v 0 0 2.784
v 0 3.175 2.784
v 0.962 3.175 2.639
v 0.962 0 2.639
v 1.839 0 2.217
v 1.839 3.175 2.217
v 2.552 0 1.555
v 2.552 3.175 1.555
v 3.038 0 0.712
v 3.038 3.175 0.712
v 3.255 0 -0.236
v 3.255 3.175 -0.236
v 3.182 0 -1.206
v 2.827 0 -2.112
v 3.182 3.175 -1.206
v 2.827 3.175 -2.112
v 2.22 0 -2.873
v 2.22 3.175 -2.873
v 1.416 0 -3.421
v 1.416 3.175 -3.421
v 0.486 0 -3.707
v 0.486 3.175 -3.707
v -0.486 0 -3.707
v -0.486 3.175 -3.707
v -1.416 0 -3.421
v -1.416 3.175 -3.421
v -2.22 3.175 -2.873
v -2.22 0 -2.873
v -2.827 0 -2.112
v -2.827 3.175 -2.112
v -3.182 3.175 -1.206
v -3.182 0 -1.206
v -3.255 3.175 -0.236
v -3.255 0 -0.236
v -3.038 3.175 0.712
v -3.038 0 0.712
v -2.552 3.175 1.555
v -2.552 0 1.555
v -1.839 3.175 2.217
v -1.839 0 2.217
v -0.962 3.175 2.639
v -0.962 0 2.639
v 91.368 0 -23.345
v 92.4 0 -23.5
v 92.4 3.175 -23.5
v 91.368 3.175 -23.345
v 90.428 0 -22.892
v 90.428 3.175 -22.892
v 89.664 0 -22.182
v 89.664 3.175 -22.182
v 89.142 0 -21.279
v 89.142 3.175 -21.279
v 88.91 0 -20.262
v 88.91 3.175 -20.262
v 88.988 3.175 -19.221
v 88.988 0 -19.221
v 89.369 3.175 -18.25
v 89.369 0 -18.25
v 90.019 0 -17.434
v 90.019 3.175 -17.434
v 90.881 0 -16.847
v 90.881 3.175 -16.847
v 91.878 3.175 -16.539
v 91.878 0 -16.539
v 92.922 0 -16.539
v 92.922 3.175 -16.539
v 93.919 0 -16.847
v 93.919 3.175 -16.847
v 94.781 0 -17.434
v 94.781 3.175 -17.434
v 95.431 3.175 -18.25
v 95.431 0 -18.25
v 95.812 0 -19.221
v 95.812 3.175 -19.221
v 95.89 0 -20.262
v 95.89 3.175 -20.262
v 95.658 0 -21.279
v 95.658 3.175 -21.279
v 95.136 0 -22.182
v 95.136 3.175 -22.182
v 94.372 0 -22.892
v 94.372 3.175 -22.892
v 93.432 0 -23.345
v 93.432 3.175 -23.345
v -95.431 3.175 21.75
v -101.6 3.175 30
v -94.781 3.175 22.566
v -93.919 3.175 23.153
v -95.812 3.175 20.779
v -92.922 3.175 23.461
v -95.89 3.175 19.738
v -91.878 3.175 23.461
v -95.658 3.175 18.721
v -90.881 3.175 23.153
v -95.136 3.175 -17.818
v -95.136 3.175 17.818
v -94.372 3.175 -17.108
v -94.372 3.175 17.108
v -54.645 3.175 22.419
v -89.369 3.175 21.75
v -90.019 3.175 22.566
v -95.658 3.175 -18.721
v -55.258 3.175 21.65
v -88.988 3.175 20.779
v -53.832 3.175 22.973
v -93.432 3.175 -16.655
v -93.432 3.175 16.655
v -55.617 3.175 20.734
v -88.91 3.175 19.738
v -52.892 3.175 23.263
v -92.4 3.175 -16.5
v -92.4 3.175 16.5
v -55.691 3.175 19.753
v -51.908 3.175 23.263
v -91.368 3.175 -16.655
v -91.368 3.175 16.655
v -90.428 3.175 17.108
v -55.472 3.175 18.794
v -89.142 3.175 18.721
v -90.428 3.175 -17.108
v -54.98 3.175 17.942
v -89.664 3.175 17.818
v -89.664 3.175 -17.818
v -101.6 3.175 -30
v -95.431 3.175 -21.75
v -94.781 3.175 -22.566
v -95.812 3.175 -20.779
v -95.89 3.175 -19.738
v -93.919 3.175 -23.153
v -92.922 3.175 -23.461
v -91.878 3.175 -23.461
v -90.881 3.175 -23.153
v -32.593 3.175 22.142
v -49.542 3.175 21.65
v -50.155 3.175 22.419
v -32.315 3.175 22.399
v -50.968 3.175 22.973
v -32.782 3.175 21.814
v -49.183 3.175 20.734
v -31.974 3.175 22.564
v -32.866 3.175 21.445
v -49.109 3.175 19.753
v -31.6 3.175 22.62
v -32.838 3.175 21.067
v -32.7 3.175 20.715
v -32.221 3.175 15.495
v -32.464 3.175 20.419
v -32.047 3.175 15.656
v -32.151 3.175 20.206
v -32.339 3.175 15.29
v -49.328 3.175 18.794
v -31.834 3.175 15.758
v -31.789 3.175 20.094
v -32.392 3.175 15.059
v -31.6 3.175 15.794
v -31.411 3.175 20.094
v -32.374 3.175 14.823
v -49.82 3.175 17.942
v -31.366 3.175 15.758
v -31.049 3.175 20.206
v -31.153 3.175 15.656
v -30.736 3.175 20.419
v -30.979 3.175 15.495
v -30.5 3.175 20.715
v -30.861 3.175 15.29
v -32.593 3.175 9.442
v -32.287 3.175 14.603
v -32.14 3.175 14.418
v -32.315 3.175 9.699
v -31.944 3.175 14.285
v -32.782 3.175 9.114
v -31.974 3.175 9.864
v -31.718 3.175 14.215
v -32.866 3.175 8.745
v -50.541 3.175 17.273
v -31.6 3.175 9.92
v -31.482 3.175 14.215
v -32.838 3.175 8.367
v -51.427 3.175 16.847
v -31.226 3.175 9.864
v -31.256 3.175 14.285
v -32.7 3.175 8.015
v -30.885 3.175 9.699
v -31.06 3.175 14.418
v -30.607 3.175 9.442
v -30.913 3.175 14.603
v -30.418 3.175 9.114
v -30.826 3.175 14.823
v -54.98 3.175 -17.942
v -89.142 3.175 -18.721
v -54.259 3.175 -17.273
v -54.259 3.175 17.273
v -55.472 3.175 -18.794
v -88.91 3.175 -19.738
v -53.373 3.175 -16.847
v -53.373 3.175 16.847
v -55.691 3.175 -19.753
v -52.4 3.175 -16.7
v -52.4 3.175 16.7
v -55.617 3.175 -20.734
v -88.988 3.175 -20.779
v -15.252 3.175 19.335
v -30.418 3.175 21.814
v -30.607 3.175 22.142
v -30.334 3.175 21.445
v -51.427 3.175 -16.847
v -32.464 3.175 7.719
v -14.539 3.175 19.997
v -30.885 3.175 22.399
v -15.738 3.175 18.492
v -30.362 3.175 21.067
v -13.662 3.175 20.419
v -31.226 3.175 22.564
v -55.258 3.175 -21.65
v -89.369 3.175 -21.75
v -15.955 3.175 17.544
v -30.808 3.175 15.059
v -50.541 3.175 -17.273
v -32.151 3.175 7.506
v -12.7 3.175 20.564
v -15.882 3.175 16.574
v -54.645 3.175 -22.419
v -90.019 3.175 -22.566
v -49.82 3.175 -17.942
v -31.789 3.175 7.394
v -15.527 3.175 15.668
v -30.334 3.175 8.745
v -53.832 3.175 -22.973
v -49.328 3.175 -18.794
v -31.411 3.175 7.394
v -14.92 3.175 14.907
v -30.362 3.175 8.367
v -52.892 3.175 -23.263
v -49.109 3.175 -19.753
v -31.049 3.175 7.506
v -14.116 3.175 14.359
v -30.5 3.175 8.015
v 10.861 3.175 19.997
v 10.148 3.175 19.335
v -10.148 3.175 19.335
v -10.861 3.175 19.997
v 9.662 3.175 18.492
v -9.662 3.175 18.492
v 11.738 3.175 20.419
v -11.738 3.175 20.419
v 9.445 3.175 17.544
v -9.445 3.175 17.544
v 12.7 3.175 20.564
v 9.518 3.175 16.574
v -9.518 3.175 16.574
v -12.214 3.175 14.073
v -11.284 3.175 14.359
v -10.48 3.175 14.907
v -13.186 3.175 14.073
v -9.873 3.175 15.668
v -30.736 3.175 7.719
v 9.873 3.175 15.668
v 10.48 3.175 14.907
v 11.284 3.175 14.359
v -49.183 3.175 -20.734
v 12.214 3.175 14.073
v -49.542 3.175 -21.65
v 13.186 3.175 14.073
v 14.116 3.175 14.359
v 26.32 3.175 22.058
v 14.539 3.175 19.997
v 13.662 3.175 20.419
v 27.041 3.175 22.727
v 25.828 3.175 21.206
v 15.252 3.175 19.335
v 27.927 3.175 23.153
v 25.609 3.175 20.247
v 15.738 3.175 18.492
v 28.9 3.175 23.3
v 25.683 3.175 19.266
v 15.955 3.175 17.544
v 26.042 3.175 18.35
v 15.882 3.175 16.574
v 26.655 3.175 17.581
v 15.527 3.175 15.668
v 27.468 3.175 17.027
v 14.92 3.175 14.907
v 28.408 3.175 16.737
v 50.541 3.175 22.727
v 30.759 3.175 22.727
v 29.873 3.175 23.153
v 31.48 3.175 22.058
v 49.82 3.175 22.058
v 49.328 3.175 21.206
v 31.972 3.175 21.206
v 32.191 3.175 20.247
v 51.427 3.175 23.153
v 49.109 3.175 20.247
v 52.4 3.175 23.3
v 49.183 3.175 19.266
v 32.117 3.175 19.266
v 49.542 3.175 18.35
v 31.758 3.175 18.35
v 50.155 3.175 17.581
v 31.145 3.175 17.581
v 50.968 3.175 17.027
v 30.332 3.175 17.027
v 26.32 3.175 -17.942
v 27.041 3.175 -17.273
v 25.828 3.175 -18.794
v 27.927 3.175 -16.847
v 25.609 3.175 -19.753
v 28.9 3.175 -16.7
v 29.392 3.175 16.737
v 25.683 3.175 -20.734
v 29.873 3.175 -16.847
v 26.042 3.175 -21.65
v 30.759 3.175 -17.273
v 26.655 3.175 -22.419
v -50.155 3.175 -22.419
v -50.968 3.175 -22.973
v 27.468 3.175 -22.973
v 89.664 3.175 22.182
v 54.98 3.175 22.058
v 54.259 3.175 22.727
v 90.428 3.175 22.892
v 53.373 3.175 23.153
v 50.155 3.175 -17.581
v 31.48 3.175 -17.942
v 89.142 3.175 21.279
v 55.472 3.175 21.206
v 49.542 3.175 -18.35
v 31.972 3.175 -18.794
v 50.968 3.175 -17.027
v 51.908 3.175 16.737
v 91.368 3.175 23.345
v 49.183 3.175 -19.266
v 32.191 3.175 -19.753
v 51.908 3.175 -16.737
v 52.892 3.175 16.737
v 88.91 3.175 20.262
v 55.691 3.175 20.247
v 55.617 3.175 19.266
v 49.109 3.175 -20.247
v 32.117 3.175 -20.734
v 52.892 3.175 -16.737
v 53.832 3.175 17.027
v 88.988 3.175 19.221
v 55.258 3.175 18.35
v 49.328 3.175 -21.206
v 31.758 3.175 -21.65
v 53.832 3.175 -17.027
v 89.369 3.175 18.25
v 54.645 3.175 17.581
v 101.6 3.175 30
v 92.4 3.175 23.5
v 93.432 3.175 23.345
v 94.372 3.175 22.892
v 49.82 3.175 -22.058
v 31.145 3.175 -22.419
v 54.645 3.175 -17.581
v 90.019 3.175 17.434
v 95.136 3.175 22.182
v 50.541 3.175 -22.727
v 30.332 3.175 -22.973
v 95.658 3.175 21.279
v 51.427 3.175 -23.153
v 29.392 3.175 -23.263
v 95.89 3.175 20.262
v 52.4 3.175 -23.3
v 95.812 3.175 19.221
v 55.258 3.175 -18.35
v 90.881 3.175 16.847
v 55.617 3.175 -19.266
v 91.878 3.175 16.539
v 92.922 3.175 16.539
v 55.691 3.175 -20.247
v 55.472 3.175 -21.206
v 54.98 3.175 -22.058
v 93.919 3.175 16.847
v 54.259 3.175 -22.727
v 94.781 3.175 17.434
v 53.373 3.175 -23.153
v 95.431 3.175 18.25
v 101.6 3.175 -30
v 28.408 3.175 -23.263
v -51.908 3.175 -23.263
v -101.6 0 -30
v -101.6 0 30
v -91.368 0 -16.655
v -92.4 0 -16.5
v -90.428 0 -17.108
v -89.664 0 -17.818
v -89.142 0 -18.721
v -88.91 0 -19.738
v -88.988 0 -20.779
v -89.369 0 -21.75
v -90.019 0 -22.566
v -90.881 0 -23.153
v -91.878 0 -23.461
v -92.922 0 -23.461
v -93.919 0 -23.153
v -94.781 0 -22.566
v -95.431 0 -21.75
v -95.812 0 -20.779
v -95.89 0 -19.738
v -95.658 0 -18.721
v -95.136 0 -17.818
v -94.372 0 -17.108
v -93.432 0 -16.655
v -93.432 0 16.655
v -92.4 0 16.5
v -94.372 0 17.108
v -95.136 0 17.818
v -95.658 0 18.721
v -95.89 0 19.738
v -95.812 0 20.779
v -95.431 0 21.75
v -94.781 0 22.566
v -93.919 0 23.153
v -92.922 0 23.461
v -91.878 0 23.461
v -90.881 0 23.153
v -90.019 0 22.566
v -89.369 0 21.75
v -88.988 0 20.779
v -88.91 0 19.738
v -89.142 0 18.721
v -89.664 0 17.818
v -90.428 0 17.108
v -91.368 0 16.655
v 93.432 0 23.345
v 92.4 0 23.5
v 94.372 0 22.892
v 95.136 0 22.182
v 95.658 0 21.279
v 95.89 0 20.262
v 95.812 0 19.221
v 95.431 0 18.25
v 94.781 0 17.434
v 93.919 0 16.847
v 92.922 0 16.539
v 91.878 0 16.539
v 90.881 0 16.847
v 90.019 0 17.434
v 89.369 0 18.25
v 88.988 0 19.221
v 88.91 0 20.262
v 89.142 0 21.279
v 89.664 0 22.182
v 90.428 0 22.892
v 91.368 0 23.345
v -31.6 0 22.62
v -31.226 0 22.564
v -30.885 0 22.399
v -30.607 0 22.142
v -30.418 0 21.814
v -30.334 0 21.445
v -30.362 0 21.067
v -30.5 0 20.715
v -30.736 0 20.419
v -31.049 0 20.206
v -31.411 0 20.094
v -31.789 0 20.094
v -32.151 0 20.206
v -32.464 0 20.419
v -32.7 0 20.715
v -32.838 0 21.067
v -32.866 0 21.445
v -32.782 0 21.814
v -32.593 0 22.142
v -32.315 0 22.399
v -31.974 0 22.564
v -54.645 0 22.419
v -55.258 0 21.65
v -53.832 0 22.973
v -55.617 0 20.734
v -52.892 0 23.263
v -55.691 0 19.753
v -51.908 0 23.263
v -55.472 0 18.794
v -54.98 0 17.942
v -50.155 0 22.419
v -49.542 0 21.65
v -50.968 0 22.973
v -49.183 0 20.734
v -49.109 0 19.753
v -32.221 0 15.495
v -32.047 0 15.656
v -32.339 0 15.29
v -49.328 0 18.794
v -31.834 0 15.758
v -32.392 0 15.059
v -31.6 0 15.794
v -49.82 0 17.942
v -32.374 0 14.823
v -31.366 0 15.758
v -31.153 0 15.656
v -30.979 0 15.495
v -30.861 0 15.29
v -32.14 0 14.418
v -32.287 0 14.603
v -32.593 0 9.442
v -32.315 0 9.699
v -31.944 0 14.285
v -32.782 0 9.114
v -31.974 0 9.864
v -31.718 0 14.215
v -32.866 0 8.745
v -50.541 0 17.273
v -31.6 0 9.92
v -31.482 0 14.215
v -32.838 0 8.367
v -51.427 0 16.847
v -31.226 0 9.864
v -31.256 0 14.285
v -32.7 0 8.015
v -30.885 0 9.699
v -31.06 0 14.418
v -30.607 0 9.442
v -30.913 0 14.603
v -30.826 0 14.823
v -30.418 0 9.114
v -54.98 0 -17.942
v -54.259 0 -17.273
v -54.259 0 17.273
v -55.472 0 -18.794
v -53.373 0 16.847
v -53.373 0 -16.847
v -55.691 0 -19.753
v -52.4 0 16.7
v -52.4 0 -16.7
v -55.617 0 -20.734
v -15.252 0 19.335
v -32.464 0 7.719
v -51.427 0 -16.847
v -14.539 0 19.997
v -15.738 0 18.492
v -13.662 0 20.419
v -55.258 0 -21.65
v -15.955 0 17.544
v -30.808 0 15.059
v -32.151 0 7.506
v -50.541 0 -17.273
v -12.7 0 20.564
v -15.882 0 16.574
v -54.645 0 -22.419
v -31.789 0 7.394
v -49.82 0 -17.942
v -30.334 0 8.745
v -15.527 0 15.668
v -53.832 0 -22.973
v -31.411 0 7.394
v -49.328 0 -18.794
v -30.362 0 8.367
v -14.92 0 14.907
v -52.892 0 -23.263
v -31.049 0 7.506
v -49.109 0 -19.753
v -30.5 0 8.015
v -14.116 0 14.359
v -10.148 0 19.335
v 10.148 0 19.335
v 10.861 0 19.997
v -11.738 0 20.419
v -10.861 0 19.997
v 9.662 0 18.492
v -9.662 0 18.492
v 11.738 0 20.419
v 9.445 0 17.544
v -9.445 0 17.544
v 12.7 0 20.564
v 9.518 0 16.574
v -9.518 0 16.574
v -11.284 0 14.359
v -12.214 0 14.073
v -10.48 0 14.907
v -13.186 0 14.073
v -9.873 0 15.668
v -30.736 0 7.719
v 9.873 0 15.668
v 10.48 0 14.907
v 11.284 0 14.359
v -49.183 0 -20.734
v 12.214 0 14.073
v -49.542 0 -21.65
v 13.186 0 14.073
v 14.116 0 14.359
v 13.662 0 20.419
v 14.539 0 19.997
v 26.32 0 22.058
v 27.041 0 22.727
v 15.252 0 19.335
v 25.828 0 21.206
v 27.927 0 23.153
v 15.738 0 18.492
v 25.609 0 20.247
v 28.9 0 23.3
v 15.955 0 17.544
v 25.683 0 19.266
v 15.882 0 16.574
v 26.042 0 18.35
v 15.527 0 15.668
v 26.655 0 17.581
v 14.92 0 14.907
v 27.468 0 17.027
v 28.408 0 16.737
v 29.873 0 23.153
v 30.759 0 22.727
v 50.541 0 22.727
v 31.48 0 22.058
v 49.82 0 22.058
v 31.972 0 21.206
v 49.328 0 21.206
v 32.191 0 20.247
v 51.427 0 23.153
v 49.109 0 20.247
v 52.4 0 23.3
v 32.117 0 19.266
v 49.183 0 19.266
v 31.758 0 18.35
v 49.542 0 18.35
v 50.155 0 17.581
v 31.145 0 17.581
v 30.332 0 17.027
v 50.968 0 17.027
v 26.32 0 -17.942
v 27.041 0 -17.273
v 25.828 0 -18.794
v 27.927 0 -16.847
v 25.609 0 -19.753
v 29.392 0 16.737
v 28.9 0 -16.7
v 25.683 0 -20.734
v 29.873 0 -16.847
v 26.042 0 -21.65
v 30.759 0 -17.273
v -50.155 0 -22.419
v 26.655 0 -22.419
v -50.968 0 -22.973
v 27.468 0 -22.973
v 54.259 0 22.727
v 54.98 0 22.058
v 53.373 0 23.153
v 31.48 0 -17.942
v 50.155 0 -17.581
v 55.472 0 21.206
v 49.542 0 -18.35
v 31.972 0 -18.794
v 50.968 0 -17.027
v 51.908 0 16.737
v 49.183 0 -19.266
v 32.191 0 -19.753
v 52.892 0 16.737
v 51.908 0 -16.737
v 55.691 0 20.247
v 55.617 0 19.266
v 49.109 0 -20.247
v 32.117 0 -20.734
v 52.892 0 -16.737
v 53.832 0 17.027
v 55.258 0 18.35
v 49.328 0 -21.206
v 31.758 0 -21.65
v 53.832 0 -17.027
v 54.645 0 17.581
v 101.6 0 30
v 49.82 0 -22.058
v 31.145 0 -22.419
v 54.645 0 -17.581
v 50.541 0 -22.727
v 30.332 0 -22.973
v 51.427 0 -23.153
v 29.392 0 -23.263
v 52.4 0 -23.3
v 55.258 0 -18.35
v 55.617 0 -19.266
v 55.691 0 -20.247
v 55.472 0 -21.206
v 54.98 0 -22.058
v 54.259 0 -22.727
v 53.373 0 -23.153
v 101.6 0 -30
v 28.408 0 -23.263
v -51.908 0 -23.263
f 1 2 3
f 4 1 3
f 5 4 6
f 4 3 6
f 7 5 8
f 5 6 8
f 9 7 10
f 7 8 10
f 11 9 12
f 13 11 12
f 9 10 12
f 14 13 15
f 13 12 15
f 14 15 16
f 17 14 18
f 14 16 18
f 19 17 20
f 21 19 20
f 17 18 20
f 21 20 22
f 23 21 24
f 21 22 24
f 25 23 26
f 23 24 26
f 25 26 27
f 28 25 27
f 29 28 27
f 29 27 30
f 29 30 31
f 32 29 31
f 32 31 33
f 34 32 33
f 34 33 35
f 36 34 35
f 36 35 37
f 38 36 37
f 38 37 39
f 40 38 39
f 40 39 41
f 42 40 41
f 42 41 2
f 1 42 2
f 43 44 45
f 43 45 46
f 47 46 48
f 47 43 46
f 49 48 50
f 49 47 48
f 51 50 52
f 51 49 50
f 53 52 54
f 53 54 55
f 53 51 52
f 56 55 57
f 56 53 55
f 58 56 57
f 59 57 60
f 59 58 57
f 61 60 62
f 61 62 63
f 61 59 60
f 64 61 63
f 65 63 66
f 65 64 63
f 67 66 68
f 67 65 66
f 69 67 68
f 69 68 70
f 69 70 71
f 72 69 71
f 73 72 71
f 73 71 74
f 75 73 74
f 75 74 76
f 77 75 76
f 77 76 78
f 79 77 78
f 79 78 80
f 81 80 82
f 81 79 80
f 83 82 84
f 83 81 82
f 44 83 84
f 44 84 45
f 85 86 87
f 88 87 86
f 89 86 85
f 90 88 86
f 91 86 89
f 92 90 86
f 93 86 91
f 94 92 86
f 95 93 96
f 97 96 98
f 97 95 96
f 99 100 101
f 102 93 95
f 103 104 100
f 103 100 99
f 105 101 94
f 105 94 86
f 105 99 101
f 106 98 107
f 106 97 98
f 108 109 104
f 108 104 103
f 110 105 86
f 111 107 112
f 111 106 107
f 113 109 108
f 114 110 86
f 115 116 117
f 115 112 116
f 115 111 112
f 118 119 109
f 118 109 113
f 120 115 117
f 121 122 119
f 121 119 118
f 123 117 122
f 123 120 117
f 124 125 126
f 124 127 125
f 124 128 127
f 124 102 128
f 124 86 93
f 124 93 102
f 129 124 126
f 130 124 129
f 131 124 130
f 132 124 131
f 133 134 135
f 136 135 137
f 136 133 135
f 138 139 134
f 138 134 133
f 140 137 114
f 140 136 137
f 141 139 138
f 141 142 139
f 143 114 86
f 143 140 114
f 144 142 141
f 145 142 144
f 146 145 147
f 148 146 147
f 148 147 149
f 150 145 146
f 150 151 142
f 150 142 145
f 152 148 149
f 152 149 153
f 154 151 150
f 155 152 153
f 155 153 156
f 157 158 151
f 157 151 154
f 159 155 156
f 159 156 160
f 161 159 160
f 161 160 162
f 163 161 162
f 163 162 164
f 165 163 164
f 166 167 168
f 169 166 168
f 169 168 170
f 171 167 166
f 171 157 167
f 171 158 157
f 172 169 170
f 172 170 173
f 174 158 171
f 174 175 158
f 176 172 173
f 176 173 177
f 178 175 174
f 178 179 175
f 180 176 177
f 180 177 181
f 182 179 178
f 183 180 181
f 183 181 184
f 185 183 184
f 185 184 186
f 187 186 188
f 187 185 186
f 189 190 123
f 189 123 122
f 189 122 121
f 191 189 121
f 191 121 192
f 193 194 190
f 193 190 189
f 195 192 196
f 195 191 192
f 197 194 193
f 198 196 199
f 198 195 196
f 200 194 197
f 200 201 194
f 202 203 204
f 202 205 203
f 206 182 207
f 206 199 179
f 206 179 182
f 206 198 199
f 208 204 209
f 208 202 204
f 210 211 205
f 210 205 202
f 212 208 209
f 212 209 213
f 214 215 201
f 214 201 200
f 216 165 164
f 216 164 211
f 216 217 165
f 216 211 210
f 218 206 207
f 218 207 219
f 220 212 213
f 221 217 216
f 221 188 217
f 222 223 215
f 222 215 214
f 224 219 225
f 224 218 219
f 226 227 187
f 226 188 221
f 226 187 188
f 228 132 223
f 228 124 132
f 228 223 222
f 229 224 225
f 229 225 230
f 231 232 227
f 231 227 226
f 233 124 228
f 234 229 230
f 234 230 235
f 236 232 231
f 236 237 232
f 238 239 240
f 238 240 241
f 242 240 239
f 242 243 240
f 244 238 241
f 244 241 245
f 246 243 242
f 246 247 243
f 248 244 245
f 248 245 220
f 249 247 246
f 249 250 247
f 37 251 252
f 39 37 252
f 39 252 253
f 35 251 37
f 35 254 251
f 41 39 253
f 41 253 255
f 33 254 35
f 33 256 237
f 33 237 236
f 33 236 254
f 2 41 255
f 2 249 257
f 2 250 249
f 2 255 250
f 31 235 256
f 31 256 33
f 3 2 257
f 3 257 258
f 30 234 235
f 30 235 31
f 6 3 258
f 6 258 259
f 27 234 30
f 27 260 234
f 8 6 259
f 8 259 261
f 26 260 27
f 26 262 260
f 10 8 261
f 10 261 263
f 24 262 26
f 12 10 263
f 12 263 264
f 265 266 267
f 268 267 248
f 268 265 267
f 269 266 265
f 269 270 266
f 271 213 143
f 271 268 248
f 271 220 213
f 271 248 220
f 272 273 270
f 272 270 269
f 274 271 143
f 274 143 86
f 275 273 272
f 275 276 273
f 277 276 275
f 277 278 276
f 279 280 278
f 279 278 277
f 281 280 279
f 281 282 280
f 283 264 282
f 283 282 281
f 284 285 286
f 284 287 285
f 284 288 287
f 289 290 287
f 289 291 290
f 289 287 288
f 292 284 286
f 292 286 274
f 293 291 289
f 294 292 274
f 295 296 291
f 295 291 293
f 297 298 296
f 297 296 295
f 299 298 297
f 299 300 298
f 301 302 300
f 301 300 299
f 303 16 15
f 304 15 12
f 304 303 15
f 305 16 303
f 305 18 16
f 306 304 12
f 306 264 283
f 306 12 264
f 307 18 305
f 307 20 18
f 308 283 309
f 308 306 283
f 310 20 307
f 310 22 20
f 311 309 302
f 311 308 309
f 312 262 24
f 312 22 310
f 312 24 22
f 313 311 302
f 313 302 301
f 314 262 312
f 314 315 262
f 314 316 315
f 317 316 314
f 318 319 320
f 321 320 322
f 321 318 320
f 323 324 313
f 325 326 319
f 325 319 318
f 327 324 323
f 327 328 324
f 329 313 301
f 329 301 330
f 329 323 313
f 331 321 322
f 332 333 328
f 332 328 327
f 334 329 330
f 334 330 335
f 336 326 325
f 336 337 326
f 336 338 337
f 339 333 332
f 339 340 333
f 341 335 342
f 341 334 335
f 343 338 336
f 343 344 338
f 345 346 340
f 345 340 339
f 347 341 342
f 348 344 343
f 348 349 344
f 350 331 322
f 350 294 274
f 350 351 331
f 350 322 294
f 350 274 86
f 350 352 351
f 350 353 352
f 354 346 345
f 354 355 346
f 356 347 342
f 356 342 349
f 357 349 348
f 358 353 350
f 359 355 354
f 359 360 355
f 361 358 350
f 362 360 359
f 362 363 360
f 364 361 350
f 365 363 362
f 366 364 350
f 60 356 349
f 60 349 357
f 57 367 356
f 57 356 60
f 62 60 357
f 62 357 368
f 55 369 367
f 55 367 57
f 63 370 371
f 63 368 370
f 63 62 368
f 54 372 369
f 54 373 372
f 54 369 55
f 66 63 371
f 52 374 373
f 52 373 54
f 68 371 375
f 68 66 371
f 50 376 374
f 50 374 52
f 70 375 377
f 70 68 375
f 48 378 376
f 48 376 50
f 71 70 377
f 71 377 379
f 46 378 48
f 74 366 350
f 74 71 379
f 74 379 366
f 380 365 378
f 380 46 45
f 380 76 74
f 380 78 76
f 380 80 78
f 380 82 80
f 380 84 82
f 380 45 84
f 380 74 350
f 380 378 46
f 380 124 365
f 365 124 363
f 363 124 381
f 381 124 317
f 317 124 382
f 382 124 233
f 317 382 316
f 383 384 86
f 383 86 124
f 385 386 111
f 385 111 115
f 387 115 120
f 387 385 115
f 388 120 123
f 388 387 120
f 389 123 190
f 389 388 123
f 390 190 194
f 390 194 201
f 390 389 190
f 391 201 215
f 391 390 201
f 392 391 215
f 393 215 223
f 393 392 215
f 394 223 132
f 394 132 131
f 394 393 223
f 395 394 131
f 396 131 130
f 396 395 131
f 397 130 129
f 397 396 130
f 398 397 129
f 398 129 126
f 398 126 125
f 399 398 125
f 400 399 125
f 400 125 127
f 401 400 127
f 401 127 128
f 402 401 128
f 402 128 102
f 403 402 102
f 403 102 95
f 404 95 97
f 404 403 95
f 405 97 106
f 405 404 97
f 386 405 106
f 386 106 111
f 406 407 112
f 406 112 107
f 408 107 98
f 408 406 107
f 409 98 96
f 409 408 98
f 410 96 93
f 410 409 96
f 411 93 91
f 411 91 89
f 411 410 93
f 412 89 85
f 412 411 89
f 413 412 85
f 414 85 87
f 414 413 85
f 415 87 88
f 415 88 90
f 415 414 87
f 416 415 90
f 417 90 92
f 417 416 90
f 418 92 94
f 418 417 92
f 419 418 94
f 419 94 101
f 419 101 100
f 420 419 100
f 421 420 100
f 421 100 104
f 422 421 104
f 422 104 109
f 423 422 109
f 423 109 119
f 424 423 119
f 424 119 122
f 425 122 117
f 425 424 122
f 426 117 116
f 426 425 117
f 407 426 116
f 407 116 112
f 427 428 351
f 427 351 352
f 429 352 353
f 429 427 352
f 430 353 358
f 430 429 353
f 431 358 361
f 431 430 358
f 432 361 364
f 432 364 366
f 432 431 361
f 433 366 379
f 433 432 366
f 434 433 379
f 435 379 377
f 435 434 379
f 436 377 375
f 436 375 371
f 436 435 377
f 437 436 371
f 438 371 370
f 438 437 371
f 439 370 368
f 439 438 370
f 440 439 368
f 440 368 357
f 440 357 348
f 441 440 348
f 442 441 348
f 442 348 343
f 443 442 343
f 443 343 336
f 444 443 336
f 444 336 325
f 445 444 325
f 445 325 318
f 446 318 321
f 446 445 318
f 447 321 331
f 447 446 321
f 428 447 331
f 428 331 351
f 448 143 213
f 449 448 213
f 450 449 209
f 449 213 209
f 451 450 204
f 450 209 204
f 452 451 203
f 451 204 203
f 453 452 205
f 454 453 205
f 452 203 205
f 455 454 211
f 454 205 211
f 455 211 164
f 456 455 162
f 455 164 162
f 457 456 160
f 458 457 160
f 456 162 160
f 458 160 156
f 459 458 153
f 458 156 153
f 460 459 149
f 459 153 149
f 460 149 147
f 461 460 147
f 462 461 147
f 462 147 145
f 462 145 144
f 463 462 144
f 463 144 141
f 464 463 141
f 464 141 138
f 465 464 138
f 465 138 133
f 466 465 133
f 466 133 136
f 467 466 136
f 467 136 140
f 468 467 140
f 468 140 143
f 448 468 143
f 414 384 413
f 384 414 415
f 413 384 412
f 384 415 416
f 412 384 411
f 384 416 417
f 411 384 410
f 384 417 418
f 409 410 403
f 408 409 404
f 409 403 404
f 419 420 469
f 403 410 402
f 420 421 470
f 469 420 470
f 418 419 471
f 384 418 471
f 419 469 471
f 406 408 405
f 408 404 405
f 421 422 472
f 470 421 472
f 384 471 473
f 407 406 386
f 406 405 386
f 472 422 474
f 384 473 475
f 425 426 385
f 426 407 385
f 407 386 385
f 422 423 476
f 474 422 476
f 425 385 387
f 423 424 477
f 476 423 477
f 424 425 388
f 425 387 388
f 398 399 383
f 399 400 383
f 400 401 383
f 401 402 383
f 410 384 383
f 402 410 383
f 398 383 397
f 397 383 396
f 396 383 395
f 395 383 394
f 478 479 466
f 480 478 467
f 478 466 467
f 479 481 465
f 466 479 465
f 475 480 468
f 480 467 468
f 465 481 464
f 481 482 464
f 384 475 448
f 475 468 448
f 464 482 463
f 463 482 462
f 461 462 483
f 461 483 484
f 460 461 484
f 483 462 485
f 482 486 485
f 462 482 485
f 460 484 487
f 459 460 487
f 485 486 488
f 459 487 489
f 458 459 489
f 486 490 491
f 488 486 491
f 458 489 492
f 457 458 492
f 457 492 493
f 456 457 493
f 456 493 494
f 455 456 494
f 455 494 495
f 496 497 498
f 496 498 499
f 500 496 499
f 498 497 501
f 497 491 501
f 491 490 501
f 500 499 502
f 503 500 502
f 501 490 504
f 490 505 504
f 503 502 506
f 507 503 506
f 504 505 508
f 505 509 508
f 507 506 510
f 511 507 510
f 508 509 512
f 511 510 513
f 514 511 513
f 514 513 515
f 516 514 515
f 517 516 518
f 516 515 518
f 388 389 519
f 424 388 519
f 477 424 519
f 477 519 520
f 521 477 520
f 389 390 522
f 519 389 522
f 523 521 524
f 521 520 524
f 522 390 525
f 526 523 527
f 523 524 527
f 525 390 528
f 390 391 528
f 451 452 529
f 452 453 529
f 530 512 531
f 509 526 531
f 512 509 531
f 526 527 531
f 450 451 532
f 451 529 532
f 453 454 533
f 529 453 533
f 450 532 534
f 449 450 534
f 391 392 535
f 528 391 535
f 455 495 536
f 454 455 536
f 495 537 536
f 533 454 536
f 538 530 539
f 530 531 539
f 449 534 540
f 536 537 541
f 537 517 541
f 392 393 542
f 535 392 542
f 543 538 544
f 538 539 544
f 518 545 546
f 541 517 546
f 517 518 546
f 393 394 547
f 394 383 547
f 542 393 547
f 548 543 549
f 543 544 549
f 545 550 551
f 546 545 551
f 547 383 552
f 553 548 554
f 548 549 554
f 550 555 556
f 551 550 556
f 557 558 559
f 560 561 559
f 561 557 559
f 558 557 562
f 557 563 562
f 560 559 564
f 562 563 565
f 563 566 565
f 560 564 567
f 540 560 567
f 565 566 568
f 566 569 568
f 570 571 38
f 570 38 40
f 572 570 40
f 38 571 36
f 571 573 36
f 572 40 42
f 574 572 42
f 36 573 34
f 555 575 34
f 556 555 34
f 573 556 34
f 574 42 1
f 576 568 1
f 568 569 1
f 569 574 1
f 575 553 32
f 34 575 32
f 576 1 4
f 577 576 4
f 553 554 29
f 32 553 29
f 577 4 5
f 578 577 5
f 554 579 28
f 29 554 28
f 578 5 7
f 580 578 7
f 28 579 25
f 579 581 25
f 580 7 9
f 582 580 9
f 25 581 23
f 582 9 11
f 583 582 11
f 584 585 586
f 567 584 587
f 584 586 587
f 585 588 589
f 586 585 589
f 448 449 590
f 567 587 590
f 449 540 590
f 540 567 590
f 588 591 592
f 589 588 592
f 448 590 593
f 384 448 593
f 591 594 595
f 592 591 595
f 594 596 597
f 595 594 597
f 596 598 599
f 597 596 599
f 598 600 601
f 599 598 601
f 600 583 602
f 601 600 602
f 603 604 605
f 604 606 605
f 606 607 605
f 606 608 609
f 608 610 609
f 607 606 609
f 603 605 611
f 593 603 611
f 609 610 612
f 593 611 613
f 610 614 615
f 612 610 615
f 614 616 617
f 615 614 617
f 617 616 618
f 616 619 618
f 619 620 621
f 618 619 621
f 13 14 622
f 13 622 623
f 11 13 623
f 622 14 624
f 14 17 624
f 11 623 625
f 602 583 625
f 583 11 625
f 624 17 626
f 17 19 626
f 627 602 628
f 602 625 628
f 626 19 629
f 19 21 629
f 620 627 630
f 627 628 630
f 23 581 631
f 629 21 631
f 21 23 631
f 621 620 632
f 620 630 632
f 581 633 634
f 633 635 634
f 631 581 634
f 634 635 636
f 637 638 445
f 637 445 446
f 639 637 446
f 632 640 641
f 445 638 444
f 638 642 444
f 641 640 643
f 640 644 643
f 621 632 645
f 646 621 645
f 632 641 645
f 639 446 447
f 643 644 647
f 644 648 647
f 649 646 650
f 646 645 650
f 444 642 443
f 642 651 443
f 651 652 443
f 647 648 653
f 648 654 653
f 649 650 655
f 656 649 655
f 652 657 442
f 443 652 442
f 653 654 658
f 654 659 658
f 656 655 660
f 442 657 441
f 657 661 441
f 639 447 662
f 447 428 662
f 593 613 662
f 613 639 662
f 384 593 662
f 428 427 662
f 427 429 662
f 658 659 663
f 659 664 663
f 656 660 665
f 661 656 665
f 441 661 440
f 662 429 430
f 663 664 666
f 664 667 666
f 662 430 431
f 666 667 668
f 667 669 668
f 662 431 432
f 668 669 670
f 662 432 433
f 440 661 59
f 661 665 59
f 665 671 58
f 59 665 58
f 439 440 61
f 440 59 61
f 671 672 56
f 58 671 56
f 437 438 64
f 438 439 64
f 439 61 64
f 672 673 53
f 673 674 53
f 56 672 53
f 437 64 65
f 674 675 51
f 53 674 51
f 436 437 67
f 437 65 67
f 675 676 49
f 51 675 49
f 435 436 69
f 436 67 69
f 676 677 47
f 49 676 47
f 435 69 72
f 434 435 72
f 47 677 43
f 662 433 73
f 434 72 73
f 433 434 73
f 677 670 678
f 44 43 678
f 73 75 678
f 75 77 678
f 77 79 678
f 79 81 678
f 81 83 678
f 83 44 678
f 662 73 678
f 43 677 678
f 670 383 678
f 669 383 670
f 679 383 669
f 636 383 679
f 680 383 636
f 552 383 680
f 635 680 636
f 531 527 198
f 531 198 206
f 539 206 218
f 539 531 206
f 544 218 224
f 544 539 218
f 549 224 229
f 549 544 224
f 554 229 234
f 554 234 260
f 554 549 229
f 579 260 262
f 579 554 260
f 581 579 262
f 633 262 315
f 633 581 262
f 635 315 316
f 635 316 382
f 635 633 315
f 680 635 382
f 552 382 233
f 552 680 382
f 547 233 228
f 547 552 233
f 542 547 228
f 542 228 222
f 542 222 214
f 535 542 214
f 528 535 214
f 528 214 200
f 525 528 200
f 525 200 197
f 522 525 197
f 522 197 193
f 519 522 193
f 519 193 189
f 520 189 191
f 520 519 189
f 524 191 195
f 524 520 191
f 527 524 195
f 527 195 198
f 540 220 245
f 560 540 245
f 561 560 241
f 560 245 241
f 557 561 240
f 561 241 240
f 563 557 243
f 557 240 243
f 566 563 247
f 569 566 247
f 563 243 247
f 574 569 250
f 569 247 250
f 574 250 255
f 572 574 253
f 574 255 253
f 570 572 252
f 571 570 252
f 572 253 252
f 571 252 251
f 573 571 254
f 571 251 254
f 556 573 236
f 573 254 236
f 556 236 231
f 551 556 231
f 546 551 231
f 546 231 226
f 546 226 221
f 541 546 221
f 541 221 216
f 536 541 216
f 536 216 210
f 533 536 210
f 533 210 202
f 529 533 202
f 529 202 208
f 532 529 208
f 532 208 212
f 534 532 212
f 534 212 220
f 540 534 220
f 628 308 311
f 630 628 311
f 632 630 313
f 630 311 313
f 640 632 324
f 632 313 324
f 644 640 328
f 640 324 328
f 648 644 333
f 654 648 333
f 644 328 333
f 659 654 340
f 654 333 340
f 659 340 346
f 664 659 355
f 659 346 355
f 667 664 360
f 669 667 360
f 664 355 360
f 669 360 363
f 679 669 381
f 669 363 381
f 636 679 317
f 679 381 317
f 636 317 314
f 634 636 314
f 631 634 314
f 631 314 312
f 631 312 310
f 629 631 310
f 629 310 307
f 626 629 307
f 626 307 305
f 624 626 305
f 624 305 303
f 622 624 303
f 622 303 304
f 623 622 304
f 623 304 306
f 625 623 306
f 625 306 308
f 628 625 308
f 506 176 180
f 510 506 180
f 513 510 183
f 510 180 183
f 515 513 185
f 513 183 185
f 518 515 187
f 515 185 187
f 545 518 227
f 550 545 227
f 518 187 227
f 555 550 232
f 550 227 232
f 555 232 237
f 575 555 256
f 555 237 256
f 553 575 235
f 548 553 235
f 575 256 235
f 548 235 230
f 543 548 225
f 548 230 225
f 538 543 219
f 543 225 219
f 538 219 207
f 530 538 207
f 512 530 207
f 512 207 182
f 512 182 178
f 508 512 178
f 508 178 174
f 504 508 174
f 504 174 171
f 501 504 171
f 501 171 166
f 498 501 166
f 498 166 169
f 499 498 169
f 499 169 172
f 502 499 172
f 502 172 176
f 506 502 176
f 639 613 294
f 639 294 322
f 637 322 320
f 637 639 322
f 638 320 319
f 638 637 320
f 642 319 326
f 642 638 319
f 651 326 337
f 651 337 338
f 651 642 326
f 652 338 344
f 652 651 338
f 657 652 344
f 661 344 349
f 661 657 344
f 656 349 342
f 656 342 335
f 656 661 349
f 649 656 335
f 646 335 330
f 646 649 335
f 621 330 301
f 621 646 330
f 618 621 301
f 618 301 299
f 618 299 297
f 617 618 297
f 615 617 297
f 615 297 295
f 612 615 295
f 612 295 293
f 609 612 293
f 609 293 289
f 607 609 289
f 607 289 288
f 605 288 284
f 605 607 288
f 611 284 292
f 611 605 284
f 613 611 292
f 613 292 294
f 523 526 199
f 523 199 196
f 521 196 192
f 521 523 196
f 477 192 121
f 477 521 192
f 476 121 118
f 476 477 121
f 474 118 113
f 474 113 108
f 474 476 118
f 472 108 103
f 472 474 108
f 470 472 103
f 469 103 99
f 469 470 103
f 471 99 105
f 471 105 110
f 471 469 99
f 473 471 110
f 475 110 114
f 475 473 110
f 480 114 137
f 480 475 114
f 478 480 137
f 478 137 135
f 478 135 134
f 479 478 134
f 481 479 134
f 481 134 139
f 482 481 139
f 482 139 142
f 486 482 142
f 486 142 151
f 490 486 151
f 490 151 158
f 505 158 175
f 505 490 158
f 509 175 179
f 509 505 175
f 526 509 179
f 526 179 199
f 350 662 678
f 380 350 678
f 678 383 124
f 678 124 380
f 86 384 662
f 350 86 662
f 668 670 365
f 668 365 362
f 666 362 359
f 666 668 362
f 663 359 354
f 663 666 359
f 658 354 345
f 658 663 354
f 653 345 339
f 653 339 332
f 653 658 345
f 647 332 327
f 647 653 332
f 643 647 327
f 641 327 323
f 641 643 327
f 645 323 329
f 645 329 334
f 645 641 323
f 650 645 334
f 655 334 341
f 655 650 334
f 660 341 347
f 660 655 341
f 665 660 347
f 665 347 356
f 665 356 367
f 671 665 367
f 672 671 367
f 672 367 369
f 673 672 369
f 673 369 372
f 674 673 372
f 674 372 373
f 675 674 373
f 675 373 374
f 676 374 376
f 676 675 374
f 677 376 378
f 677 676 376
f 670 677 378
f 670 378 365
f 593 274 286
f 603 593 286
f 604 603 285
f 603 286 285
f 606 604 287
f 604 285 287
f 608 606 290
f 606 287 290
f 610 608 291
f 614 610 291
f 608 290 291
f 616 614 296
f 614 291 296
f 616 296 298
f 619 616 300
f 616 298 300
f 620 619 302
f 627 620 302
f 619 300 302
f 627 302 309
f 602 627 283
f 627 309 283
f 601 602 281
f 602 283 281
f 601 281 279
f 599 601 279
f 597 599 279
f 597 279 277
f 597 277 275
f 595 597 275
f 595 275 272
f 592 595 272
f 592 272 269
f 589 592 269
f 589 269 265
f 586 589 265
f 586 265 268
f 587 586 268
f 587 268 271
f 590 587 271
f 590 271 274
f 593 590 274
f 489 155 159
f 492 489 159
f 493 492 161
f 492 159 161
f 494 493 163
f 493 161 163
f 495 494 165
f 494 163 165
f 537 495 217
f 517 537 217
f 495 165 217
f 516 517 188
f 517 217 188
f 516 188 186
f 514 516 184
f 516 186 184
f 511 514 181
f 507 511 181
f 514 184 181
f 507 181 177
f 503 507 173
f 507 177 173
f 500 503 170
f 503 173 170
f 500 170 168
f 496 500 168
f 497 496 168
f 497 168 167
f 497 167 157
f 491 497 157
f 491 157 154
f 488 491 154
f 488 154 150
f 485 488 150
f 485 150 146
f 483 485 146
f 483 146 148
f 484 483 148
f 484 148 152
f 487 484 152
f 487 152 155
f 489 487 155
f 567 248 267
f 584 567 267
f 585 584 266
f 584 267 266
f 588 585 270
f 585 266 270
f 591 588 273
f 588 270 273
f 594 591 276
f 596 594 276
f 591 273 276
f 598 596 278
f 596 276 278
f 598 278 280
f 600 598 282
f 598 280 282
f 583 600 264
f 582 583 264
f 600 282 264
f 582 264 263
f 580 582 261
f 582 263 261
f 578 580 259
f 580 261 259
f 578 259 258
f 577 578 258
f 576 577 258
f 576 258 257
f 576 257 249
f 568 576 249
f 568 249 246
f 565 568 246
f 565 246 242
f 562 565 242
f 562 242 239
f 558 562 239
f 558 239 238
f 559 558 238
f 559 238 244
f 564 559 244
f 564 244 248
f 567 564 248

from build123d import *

# Parameters (mm, degrees)
SKETCH1_W                      = 203.2
SKETCH1_H                      = 60
SKETCH1_R                      = 3.3
SKETCH1_R_2                    = 3.5
BOSS_EXTRUDE1_DEPTH            = 3.175
SKETCH2_R                      = 3.2639
F_1_4_20_FOR_NUT_BRACKET_DEPTH = 106.984152707
SKETCH3_R                      = 0.79375
SKETCH3_R_2                    = 1.27
WIRE_HOLDER_DEPTH              = 106.984152707
SKETCH4_R                      = 3.3
CUT_EXTRUDE1_DEPTH             = 106.984152707


with BuildPart() as part:
    # Sketch1 → Boss-Extrude1 (new body)
    with BuildSketch(Plane(origin=(0, 0, 0), x_dir=(1, 0, 0), z_dir=(0, 1, 0))):
        Rectangle(SKETCH1_W, SKETCH1_H)
        with Locations(Location((-52.4, 20, 0), (0, 0, 270))):
            Circle(SKETCH1_R, mode=Mode.SUBTRACT)
        with Locations(Location((-92.4, -20, 0), (0, 0, 90))):
            Circle(SKETCH1_R_2, mode=Mode.SUBTRACT)
        with Locations(Location((-52.4, -20, 0), (0, 0, 90))):
            Circle(SKETCH1_R, mode=Mode.SUBTRACT)
        with Locations(Location((92.4, 20, 0), (0, 0, 90))):
            Circle(SKETCH1_R_2, mode=Mode.SUBTRACT)
        with Locations(Location((-92.4, 20, 0), (0, 0, 270))):
            Circle(SKETCH1_R_2, mode=Mode.SUBTRACT)
        with Locations(Location((52.4, -20, 0), (0, 0, 270))):
            Circle(SKETCH1_R, mode=Mode.SUBTRACT)
        with Locations(Location((92.4, -20, 0), (0, 0, 270))):
            Circle(SKETCH1_R_2, mode=Mode.SUBTRACT)
        with Locations(Location((52.4, 20, 0), (0, 0, 90))):
            Circle(SKETCH1_R, mode=Mode.SUBTRACT)
    extrude(amount=BOSS_EXTRUDE1_DEPTH)

    # Sketch2 → 1/4-20 for Nut Bracket (cut, through all)
    with BuildSketch(Plane(origin=(0, 3.175, 0), x_dir=(1, 0, 0), z_dir=(0, 1, 0))):
        with Locations(Location((-12.7, -17.3, 0), (0, 0, 270))):
            Circle(SKETCH2_R)
        with Locations(Location((12.7, -17.3, 0), (0, 0, 270))):
            Circle(SKETCH2_R)
        with Locations(Location((0, 0.48, 0), (0, 0, 270))):
            Circle(SKETCH2_R)
    extrude(amount=-F_1_4_20_FOR_NUT_BRACKET_DEPTH, mode=Mode.SUBTRACT)

    # Sketch3 → Wire Holder (cut, through all)
    with BuildSketch(Plane(origin=(0, 3.175, 0), x_dir=(1, 0, 0), z_dir=(0, 1, 0))):
        with Locations(Location((-31.6, -15, 0), (0, 0, 270))):
            Circle(SKETCH3_R)
        with Locations(Location((-31.6, -8.65, 0), (0, 0, 270))):
            Circle(SKETCH3_R_2)
        with Locations(Location((-31.6, -21.35, 0), (0, 0, 270))):
            Circle(SKETCH3_R_2)
    extrude(amount=-WIRE_HOLDER_DEPTH, mode=Mode.SUBTRACT)

    # Sketch4 → Cut-Extrude1 (cut, through all)
    with BuildSketch(Plane(origin=(0, 3.175, 0), x_dir=(1, 0, 0), z_dir=(0, 1, 0))):
        with Locations(Location((28.9, -20, 0), (0, 0, 270))):
            Circle(SKETCH4_R)
        with Locations(Location((28.9, 20, 0), (0, 0, 270))):
            Circle(SKETCH4_R)
    extrude(amount=-CUT_EXTRUDE1_DEPTH, mode=Mode.SUBTRACT)


solid = part.part
